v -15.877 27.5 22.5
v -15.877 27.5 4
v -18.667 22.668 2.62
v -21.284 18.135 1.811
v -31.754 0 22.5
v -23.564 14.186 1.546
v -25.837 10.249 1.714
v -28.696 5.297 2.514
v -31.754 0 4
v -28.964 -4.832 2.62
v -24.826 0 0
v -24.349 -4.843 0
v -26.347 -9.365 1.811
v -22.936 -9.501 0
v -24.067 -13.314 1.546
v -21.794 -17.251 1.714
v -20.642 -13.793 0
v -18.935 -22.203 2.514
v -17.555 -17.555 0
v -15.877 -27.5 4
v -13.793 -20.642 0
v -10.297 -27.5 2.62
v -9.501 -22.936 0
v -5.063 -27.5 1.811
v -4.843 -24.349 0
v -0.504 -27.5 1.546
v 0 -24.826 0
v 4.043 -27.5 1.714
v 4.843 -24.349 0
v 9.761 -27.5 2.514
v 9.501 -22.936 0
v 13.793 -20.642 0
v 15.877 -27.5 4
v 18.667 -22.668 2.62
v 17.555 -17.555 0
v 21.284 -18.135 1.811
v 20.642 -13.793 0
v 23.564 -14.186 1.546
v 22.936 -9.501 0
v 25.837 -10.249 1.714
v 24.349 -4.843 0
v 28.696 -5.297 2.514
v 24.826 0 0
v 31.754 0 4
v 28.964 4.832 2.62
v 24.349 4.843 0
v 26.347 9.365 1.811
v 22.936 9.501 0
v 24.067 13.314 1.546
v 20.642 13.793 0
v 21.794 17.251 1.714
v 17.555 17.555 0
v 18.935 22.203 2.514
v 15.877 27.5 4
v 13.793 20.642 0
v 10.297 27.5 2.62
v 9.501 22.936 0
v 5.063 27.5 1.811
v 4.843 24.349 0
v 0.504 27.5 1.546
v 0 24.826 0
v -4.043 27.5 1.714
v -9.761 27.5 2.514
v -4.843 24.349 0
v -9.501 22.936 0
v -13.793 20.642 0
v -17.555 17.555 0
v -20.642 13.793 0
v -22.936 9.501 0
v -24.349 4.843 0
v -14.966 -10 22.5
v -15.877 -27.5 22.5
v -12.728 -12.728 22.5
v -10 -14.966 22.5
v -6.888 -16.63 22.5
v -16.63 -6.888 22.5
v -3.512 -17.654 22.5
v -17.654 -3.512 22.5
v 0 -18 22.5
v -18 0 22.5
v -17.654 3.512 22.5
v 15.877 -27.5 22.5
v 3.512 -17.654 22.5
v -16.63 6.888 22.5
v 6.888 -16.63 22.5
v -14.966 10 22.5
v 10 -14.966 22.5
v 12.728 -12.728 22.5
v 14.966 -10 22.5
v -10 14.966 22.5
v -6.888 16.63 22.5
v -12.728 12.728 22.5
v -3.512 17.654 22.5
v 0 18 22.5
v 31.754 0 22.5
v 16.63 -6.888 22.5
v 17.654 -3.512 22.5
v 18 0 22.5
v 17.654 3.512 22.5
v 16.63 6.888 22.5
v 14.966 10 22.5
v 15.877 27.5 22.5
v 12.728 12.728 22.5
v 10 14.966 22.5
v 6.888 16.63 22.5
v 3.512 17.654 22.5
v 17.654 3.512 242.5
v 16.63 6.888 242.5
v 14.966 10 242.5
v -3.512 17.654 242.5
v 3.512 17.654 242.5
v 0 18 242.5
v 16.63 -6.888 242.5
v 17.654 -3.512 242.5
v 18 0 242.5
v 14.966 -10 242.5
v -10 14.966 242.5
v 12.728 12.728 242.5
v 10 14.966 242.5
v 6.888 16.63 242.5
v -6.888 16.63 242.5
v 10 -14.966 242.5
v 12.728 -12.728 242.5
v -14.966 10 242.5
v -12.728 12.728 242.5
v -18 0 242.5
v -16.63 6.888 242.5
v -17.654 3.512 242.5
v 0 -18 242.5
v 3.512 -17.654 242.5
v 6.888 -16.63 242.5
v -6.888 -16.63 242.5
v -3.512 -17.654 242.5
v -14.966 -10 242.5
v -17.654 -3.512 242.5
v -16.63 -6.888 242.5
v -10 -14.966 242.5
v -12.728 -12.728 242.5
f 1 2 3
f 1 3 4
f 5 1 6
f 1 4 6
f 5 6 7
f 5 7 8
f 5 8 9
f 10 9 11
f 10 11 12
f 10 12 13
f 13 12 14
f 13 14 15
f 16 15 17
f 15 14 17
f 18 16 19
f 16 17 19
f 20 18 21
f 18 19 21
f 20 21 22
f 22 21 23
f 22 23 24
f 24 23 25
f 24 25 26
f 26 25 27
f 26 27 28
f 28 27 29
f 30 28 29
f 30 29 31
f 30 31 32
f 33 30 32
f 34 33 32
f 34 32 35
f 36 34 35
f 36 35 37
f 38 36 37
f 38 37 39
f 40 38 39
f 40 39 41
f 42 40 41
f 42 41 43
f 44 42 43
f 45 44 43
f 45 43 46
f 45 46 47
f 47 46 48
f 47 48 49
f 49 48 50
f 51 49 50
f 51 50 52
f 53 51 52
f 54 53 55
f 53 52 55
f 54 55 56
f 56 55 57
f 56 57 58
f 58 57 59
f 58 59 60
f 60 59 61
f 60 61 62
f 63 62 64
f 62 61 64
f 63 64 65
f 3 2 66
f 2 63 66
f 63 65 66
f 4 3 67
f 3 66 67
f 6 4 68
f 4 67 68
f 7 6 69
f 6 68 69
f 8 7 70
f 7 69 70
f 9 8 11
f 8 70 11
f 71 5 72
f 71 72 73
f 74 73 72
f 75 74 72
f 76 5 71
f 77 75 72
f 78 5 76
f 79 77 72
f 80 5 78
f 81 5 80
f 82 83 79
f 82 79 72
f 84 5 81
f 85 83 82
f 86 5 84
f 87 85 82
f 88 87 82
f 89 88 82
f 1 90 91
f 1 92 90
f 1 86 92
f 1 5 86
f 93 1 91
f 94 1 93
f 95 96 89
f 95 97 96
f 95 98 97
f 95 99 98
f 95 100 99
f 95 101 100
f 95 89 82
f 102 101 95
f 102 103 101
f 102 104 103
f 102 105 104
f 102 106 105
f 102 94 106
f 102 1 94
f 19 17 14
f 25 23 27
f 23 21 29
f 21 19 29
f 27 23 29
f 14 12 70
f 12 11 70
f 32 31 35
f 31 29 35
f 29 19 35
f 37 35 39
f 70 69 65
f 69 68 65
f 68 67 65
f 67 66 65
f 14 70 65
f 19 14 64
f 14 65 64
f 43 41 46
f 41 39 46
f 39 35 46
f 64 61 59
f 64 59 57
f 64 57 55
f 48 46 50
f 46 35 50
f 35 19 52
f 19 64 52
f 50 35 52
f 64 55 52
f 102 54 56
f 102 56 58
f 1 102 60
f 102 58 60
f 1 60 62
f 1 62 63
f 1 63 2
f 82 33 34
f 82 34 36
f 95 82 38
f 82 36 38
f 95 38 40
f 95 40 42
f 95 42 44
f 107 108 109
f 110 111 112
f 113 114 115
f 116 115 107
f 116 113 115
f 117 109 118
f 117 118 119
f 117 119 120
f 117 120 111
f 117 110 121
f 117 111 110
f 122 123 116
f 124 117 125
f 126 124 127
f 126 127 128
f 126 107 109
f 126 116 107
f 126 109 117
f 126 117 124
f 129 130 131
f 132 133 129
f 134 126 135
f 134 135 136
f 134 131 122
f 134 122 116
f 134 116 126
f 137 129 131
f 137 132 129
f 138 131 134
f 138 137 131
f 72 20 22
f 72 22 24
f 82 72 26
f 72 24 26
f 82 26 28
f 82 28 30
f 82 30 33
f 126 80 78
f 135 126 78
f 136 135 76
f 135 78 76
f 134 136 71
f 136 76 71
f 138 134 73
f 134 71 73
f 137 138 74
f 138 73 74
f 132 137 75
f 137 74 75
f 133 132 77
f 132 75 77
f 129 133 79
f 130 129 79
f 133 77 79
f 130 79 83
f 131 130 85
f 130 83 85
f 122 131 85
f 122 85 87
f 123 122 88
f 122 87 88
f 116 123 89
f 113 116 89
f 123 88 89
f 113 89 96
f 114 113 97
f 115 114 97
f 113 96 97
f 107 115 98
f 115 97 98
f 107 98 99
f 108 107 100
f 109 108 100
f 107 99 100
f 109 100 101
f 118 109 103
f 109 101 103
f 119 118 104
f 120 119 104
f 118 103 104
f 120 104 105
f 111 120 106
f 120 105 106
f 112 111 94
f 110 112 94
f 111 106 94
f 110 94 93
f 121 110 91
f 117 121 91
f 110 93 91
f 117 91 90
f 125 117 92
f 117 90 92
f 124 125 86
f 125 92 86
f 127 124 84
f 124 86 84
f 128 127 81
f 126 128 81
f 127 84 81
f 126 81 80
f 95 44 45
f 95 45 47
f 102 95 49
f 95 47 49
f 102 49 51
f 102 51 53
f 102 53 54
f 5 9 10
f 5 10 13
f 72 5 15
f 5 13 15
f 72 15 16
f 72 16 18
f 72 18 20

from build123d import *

# Parameters (mm, degrees)
EXTRUDE_1_DEPTH = 22.5
SKETCH_2_R      = 18
EXTRUDE_2_DEPTH = 220


with BuildPart() as part:
    # 草图1 → 拉伸1 (new body)
    with BuildSketch(Plane.XY):
        Polygon((31.754264805, 0), (15.877132403, 27.5), (-15.877132403, 27.5), (-31.754264805, 0), (-15.877132403, -27.5), (15.877132403, -27.5), align=None)
    extrude(amount=EXTRUDE_1_DEPTH)

    # 草图2 → 拉伸2 (add)
    with BuildSketch(Plane.XY.offset(22.5)):
        Circle(SKETCH_2_R)
    extrude(amount=EXTRUDE_2_DEPTH)

    # 草图3 → 切除-旋转1 (revolve, cut)
    with BuildSketch(Plane(origin=(0, 0, 0), x_dir=(1, 0, 0), z_dir=(0, 1, 0))):
        Polygon((31.754264805, -4), (4.6012476, 11.676801793), (47.244906426, 19.875201242), align=None)
    revolve(axis=Axis((0, 0, -27.609458248), (0, 0, 1)), mode=Mode.SUBTRACT)


solid = part.part
